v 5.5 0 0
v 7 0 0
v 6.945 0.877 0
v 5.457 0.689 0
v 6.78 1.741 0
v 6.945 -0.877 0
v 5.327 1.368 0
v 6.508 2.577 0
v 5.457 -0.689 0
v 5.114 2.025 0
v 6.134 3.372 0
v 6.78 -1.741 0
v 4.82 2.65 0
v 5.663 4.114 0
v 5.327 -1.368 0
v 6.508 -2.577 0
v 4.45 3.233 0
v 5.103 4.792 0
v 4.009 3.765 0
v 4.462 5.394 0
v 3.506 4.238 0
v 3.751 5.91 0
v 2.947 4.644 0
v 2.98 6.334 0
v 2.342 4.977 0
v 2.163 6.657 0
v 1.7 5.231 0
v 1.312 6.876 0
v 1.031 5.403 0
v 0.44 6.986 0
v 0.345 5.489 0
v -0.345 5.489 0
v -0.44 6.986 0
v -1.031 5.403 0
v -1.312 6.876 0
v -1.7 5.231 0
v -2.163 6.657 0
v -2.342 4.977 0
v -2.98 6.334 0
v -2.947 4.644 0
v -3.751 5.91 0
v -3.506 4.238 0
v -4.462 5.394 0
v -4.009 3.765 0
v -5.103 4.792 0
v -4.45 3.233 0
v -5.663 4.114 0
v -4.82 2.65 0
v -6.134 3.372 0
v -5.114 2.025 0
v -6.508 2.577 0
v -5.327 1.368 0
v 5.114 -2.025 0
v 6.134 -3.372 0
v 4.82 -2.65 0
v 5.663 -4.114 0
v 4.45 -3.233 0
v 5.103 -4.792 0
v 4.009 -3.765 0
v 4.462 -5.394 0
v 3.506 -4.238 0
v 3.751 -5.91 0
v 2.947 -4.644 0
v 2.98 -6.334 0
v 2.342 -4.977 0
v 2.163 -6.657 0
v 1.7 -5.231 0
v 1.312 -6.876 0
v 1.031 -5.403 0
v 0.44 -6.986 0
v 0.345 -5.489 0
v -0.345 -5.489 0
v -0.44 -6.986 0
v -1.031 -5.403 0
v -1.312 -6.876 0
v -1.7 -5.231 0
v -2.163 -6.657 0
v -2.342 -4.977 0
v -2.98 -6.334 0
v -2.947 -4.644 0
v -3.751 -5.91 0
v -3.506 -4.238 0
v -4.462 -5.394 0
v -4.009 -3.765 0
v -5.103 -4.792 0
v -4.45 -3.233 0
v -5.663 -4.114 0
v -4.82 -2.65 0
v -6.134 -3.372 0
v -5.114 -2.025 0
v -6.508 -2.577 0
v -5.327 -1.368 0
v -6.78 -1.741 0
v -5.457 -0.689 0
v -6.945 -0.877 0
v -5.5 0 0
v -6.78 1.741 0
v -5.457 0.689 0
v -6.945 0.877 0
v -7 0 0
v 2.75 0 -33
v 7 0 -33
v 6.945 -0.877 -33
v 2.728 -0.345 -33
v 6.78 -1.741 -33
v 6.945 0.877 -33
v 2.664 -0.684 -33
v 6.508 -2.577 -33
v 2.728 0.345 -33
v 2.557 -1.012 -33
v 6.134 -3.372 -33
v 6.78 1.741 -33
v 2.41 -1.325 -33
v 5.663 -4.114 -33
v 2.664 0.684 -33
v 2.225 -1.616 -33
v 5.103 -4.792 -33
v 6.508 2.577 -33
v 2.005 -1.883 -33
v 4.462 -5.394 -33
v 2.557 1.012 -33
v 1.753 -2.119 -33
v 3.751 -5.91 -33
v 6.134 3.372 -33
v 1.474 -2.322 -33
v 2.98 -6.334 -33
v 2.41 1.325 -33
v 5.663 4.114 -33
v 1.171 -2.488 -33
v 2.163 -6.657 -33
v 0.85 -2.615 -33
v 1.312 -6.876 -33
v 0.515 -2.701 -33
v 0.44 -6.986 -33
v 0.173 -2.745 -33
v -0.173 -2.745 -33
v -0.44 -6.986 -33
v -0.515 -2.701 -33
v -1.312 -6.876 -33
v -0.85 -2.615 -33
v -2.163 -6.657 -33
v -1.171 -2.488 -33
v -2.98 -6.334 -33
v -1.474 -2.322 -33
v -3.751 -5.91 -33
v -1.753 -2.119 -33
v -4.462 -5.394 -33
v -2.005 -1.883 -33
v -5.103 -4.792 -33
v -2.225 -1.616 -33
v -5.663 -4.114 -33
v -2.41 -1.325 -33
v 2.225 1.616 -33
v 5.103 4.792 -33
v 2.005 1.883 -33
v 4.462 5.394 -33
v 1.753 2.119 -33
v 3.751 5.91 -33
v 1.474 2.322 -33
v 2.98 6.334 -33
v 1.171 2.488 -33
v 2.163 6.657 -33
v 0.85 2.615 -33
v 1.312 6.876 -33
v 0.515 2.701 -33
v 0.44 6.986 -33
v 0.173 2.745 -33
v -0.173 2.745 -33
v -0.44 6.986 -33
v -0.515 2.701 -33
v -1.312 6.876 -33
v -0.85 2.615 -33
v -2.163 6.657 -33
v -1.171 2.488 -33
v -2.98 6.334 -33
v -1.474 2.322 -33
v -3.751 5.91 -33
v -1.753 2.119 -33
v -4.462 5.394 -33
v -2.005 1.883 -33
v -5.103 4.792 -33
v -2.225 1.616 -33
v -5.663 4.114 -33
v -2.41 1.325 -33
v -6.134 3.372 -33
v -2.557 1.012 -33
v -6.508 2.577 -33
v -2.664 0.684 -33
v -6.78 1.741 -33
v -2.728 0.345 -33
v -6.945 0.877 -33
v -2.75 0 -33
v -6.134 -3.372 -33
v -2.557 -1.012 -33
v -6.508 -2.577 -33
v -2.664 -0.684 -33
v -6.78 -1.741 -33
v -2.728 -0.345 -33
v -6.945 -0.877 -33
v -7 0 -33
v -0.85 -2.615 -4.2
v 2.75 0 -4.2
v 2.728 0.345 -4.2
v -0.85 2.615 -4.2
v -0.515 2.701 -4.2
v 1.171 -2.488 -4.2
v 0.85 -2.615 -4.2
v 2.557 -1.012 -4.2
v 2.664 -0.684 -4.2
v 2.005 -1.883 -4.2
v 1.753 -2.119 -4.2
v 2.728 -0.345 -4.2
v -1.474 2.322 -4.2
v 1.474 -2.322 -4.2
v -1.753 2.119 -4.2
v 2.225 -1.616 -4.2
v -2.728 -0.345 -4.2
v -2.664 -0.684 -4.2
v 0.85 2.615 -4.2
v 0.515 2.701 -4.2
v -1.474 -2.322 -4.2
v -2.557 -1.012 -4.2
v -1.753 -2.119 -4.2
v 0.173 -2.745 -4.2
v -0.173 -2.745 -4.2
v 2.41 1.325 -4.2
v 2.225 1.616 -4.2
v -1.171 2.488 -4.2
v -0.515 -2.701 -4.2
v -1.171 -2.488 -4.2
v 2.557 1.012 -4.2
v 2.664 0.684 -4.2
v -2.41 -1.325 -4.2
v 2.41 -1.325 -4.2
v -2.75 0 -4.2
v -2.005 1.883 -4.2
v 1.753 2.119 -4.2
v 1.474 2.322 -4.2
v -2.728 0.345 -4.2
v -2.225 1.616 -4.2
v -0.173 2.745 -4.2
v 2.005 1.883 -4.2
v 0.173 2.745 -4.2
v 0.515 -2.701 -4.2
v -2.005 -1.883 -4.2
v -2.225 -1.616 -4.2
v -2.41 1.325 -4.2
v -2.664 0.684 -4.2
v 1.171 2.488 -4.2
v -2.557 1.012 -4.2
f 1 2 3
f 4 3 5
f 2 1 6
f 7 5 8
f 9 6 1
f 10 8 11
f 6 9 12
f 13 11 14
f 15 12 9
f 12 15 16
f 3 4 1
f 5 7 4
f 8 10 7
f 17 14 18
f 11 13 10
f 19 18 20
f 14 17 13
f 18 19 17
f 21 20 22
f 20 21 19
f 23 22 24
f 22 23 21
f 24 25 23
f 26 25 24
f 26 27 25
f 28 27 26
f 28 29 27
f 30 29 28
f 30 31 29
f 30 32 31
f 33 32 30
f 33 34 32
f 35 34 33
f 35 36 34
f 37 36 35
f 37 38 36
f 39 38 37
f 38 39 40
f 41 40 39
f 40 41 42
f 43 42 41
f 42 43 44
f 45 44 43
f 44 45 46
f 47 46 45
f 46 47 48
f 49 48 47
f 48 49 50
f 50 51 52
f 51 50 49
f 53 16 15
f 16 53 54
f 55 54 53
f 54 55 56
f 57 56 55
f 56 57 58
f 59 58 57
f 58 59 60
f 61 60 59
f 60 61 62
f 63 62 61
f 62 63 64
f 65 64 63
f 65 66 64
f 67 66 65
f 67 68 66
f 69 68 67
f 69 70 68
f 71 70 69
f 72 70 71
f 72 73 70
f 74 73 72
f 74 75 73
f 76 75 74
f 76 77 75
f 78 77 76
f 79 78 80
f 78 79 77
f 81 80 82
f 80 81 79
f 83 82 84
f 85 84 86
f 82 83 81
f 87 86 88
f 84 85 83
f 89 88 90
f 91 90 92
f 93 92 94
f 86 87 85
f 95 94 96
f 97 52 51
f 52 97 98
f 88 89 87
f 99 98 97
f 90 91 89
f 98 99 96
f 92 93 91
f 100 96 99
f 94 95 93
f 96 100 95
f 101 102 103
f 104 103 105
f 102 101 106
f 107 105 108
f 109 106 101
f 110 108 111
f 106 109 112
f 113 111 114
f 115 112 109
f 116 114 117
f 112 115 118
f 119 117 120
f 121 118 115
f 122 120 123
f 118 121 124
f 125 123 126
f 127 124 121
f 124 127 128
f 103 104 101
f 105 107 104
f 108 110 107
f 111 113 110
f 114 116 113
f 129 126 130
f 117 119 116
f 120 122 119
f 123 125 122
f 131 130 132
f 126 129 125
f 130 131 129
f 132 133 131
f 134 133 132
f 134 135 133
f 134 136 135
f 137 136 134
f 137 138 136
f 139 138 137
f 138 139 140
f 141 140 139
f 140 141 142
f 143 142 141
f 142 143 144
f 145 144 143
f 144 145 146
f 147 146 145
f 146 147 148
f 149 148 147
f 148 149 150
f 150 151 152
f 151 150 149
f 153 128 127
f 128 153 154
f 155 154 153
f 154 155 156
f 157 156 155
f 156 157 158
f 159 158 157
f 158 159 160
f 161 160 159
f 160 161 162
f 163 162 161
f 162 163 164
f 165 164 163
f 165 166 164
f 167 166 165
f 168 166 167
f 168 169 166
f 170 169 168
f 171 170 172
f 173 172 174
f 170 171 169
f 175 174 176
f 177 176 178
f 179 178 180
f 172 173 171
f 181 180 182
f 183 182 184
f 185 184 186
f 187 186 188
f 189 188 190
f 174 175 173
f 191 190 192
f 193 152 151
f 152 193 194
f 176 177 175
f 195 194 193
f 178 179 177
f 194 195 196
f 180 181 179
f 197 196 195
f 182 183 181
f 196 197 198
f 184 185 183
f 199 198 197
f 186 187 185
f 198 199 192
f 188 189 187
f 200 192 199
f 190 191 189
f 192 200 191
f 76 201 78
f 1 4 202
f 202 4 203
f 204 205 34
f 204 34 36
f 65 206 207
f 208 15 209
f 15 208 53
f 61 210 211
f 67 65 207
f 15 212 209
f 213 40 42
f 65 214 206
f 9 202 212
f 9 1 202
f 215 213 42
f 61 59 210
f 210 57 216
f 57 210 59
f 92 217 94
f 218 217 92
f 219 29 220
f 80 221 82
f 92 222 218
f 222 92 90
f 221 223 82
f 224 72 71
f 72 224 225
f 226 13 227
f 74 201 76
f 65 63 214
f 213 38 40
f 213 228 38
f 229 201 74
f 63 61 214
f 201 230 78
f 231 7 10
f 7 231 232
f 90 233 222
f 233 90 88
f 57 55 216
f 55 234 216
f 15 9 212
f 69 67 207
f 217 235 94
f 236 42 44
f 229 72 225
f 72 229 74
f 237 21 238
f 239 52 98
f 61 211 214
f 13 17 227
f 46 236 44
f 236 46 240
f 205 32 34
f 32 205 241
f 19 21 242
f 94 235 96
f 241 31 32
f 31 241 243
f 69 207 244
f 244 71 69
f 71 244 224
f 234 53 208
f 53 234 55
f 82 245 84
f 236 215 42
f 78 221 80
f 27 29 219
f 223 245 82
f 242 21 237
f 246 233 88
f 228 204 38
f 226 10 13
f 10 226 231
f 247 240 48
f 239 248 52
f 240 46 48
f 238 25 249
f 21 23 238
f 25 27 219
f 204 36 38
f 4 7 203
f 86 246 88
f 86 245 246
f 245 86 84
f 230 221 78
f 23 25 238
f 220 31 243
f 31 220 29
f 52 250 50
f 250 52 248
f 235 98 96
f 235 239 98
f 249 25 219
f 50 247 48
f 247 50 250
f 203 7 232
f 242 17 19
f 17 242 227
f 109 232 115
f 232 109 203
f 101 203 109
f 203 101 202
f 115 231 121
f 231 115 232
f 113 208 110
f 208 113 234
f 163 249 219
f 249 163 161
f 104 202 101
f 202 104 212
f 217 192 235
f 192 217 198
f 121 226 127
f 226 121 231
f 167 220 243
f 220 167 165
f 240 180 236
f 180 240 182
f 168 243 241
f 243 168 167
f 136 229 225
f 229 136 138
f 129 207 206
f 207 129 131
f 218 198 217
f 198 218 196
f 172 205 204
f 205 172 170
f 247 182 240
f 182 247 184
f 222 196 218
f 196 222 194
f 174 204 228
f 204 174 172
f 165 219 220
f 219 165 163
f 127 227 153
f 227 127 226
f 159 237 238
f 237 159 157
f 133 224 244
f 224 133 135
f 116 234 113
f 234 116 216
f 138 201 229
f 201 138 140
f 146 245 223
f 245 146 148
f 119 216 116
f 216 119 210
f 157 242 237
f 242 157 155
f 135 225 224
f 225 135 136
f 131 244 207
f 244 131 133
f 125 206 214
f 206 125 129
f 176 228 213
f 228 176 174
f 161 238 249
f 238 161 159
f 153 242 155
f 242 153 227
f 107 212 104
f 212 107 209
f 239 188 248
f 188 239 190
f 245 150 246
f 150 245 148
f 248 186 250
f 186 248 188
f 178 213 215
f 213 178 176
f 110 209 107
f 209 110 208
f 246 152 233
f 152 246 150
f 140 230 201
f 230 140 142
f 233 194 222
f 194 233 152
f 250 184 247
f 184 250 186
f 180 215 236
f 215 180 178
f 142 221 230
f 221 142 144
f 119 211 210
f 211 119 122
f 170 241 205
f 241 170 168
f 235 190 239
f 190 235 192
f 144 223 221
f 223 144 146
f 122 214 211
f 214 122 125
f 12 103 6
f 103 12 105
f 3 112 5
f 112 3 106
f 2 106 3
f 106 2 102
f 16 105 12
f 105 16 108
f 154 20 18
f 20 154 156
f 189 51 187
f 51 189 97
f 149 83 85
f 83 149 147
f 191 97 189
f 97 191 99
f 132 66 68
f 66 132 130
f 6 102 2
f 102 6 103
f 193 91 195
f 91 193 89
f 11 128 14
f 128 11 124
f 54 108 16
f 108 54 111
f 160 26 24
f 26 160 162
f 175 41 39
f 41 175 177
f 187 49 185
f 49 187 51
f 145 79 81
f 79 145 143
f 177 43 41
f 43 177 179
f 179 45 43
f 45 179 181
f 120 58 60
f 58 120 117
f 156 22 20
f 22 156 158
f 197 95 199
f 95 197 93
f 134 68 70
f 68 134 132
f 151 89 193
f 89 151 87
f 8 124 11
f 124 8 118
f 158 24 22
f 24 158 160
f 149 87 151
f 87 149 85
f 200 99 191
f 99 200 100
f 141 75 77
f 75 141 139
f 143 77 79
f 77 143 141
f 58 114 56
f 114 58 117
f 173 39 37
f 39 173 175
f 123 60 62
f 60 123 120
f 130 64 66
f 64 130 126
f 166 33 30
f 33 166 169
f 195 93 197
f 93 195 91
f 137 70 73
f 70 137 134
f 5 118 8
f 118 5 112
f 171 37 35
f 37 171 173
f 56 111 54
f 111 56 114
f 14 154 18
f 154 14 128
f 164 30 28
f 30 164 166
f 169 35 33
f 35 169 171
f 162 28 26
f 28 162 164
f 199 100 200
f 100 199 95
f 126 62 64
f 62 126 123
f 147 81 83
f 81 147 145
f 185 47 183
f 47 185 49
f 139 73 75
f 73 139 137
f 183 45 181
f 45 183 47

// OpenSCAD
$fn = 50;


difference() {
	union() {
		translate(v = [0, 0, -33.0000000000]) {
			cylinder(h = 33, r = 7.0000000000);
		}
	}
	union() {
		translate(v = [0, 0, 0]) {
			rotate(a = [0, 0, 0]) {
				difference() {
					union() {
						#translate(v = [0, 0, -33.0000000000]) {
							cylinder(h = 33, r = 2.2500000000);
						}
						#translate(v = [0, 0, -4.2000000000]) {
							cylinder(h = 4.2000000000, r = 7.0000000000, r1 = 2.7500000000, r2 = 5.5000000000);
						}
						#translate(v = [0, 0, -33.0000000000]) {
							cylinder(h = 33, r = 2.7500000000);
						}
						#translate(v = [0, 0, -33.0000000000]) {
							cylinder(h = 33, r = 2.2500000000);
						}
					}
					union();
				}
			}
		}
	}
}
